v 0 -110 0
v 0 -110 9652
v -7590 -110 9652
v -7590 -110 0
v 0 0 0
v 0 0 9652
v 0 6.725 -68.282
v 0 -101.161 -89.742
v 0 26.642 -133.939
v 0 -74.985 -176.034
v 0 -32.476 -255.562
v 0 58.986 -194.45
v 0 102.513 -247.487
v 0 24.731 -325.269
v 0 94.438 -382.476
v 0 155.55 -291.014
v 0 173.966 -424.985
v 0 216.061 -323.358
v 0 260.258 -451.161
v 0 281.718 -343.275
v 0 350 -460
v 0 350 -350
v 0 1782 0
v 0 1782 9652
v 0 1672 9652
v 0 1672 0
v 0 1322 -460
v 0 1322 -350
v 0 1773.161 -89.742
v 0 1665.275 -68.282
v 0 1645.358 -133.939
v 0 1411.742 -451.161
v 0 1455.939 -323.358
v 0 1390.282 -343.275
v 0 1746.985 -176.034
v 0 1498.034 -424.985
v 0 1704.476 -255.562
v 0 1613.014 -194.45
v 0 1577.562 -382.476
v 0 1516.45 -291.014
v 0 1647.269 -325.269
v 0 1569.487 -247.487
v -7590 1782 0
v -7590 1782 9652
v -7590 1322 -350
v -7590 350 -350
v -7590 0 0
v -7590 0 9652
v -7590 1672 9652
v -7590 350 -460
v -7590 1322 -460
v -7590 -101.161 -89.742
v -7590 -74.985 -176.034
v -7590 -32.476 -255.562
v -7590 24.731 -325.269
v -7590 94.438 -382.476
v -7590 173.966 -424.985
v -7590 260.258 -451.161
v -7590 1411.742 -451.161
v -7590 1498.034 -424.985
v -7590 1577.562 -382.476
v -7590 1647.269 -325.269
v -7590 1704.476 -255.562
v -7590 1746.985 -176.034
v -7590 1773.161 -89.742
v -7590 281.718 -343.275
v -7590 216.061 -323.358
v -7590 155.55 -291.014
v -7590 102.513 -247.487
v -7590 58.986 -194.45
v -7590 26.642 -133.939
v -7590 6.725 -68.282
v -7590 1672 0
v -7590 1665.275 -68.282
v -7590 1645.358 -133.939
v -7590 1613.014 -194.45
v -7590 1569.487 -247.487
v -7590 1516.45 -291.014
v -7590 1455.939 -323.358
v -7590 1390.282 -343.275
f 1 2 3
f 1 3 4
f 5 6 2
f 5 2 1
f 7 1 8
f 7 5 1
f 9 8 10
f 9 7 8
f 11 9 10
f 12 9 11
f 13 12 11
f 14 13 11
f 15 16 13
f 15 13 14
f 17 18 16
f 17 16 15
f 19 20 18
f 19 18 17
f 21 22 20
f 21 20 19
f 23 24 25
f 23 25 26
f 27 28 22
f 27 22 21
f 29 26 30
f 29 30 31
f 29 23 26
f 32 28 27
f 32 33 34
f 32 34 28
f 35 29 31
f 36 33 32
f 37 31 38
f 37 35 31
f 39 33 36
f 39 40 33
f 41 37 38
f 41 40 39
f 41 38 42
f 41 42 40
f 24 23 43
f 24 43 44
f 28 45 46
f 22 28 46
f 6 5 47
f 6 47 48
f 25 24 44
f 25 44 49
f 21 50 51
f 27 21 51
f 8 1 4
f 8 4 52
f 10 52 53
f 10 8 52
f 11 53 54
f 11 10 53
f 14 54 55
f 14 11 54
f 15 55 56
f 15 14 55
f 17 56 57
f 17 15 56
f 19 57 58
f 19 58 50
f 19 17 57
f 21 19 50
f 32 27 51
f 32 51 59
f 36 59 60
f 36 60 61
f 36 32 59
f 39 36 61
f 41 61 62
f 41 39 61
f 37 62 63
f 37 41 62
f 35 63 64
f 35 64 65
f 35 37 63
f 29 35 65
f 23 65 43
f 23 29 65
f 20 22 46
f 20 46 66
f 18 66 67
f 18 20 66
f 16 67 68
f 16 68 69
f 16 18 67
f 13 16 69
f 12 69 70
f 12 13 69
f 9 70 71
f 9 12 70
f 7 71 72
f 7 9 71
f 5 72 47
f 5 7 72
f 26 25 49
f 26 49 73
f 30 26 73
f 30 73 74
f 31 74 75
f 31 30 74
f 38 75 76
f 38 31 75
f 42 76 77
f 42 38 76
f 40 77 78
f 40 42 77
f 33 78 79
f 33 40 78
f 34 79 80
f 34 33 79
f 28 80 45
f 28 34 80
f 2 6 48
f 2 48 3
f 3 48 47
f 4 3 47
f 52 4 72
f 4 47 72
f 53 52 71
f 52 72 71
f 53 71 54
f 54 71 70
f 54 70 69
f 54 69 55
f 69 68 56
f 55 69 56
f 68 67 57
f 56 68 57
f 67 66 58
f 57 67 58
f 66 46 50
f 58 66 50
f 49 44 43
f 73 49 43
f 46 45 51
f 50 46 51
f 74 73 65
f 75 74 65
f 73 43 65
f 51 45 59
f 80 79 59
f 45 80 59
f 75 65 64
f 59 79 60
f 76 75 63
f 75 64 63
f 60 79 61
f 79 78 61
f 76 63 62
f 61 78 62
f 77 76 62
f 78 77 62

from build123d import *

# Parameters (mm, degrees)
BOSS_EXTRUDE1_DEPTH = 7590


with BuildPart() as part:
    # Sketch1 → Boss-Extrude1 (new body)
    with BuildSketch(Plane(origin=(0, 0, 0), x_dir=(0, 0, -1), z_dir=(1, 0, 0))):
        with BuildLine():
            Line((0, 0), (-9652, 0))
            Line((-9652, 0), (-9652, -110))
            Line((-9652, -110), (0, -110))
            ThreePointArc((0, -110), (325.269119346, 24.730880654), (460, 350))
            Line((460, 350), (460, 1322))
            ThreePointArc((460, 1322), (325.269119346, 1647.269119346), (0, 1782))
            Line((0, 1782), (-9652, 1782))
            Line((-9652, 1782), (-9652, 1672))
            Line((-9652, 1672), (0, 1672))
            ThreePointArc((0, 1672), (247.487373415, 1569.487373415), (350, 1322))
            Line((350, 1322), (350, 350))
            ThreePointArc((350, 350), (247.487373415, 102.512626585), (0, 0))
        make_face()
    extrude(amount=-BOSS_EXTRUDE1_DEPTH)


solid = part.part
